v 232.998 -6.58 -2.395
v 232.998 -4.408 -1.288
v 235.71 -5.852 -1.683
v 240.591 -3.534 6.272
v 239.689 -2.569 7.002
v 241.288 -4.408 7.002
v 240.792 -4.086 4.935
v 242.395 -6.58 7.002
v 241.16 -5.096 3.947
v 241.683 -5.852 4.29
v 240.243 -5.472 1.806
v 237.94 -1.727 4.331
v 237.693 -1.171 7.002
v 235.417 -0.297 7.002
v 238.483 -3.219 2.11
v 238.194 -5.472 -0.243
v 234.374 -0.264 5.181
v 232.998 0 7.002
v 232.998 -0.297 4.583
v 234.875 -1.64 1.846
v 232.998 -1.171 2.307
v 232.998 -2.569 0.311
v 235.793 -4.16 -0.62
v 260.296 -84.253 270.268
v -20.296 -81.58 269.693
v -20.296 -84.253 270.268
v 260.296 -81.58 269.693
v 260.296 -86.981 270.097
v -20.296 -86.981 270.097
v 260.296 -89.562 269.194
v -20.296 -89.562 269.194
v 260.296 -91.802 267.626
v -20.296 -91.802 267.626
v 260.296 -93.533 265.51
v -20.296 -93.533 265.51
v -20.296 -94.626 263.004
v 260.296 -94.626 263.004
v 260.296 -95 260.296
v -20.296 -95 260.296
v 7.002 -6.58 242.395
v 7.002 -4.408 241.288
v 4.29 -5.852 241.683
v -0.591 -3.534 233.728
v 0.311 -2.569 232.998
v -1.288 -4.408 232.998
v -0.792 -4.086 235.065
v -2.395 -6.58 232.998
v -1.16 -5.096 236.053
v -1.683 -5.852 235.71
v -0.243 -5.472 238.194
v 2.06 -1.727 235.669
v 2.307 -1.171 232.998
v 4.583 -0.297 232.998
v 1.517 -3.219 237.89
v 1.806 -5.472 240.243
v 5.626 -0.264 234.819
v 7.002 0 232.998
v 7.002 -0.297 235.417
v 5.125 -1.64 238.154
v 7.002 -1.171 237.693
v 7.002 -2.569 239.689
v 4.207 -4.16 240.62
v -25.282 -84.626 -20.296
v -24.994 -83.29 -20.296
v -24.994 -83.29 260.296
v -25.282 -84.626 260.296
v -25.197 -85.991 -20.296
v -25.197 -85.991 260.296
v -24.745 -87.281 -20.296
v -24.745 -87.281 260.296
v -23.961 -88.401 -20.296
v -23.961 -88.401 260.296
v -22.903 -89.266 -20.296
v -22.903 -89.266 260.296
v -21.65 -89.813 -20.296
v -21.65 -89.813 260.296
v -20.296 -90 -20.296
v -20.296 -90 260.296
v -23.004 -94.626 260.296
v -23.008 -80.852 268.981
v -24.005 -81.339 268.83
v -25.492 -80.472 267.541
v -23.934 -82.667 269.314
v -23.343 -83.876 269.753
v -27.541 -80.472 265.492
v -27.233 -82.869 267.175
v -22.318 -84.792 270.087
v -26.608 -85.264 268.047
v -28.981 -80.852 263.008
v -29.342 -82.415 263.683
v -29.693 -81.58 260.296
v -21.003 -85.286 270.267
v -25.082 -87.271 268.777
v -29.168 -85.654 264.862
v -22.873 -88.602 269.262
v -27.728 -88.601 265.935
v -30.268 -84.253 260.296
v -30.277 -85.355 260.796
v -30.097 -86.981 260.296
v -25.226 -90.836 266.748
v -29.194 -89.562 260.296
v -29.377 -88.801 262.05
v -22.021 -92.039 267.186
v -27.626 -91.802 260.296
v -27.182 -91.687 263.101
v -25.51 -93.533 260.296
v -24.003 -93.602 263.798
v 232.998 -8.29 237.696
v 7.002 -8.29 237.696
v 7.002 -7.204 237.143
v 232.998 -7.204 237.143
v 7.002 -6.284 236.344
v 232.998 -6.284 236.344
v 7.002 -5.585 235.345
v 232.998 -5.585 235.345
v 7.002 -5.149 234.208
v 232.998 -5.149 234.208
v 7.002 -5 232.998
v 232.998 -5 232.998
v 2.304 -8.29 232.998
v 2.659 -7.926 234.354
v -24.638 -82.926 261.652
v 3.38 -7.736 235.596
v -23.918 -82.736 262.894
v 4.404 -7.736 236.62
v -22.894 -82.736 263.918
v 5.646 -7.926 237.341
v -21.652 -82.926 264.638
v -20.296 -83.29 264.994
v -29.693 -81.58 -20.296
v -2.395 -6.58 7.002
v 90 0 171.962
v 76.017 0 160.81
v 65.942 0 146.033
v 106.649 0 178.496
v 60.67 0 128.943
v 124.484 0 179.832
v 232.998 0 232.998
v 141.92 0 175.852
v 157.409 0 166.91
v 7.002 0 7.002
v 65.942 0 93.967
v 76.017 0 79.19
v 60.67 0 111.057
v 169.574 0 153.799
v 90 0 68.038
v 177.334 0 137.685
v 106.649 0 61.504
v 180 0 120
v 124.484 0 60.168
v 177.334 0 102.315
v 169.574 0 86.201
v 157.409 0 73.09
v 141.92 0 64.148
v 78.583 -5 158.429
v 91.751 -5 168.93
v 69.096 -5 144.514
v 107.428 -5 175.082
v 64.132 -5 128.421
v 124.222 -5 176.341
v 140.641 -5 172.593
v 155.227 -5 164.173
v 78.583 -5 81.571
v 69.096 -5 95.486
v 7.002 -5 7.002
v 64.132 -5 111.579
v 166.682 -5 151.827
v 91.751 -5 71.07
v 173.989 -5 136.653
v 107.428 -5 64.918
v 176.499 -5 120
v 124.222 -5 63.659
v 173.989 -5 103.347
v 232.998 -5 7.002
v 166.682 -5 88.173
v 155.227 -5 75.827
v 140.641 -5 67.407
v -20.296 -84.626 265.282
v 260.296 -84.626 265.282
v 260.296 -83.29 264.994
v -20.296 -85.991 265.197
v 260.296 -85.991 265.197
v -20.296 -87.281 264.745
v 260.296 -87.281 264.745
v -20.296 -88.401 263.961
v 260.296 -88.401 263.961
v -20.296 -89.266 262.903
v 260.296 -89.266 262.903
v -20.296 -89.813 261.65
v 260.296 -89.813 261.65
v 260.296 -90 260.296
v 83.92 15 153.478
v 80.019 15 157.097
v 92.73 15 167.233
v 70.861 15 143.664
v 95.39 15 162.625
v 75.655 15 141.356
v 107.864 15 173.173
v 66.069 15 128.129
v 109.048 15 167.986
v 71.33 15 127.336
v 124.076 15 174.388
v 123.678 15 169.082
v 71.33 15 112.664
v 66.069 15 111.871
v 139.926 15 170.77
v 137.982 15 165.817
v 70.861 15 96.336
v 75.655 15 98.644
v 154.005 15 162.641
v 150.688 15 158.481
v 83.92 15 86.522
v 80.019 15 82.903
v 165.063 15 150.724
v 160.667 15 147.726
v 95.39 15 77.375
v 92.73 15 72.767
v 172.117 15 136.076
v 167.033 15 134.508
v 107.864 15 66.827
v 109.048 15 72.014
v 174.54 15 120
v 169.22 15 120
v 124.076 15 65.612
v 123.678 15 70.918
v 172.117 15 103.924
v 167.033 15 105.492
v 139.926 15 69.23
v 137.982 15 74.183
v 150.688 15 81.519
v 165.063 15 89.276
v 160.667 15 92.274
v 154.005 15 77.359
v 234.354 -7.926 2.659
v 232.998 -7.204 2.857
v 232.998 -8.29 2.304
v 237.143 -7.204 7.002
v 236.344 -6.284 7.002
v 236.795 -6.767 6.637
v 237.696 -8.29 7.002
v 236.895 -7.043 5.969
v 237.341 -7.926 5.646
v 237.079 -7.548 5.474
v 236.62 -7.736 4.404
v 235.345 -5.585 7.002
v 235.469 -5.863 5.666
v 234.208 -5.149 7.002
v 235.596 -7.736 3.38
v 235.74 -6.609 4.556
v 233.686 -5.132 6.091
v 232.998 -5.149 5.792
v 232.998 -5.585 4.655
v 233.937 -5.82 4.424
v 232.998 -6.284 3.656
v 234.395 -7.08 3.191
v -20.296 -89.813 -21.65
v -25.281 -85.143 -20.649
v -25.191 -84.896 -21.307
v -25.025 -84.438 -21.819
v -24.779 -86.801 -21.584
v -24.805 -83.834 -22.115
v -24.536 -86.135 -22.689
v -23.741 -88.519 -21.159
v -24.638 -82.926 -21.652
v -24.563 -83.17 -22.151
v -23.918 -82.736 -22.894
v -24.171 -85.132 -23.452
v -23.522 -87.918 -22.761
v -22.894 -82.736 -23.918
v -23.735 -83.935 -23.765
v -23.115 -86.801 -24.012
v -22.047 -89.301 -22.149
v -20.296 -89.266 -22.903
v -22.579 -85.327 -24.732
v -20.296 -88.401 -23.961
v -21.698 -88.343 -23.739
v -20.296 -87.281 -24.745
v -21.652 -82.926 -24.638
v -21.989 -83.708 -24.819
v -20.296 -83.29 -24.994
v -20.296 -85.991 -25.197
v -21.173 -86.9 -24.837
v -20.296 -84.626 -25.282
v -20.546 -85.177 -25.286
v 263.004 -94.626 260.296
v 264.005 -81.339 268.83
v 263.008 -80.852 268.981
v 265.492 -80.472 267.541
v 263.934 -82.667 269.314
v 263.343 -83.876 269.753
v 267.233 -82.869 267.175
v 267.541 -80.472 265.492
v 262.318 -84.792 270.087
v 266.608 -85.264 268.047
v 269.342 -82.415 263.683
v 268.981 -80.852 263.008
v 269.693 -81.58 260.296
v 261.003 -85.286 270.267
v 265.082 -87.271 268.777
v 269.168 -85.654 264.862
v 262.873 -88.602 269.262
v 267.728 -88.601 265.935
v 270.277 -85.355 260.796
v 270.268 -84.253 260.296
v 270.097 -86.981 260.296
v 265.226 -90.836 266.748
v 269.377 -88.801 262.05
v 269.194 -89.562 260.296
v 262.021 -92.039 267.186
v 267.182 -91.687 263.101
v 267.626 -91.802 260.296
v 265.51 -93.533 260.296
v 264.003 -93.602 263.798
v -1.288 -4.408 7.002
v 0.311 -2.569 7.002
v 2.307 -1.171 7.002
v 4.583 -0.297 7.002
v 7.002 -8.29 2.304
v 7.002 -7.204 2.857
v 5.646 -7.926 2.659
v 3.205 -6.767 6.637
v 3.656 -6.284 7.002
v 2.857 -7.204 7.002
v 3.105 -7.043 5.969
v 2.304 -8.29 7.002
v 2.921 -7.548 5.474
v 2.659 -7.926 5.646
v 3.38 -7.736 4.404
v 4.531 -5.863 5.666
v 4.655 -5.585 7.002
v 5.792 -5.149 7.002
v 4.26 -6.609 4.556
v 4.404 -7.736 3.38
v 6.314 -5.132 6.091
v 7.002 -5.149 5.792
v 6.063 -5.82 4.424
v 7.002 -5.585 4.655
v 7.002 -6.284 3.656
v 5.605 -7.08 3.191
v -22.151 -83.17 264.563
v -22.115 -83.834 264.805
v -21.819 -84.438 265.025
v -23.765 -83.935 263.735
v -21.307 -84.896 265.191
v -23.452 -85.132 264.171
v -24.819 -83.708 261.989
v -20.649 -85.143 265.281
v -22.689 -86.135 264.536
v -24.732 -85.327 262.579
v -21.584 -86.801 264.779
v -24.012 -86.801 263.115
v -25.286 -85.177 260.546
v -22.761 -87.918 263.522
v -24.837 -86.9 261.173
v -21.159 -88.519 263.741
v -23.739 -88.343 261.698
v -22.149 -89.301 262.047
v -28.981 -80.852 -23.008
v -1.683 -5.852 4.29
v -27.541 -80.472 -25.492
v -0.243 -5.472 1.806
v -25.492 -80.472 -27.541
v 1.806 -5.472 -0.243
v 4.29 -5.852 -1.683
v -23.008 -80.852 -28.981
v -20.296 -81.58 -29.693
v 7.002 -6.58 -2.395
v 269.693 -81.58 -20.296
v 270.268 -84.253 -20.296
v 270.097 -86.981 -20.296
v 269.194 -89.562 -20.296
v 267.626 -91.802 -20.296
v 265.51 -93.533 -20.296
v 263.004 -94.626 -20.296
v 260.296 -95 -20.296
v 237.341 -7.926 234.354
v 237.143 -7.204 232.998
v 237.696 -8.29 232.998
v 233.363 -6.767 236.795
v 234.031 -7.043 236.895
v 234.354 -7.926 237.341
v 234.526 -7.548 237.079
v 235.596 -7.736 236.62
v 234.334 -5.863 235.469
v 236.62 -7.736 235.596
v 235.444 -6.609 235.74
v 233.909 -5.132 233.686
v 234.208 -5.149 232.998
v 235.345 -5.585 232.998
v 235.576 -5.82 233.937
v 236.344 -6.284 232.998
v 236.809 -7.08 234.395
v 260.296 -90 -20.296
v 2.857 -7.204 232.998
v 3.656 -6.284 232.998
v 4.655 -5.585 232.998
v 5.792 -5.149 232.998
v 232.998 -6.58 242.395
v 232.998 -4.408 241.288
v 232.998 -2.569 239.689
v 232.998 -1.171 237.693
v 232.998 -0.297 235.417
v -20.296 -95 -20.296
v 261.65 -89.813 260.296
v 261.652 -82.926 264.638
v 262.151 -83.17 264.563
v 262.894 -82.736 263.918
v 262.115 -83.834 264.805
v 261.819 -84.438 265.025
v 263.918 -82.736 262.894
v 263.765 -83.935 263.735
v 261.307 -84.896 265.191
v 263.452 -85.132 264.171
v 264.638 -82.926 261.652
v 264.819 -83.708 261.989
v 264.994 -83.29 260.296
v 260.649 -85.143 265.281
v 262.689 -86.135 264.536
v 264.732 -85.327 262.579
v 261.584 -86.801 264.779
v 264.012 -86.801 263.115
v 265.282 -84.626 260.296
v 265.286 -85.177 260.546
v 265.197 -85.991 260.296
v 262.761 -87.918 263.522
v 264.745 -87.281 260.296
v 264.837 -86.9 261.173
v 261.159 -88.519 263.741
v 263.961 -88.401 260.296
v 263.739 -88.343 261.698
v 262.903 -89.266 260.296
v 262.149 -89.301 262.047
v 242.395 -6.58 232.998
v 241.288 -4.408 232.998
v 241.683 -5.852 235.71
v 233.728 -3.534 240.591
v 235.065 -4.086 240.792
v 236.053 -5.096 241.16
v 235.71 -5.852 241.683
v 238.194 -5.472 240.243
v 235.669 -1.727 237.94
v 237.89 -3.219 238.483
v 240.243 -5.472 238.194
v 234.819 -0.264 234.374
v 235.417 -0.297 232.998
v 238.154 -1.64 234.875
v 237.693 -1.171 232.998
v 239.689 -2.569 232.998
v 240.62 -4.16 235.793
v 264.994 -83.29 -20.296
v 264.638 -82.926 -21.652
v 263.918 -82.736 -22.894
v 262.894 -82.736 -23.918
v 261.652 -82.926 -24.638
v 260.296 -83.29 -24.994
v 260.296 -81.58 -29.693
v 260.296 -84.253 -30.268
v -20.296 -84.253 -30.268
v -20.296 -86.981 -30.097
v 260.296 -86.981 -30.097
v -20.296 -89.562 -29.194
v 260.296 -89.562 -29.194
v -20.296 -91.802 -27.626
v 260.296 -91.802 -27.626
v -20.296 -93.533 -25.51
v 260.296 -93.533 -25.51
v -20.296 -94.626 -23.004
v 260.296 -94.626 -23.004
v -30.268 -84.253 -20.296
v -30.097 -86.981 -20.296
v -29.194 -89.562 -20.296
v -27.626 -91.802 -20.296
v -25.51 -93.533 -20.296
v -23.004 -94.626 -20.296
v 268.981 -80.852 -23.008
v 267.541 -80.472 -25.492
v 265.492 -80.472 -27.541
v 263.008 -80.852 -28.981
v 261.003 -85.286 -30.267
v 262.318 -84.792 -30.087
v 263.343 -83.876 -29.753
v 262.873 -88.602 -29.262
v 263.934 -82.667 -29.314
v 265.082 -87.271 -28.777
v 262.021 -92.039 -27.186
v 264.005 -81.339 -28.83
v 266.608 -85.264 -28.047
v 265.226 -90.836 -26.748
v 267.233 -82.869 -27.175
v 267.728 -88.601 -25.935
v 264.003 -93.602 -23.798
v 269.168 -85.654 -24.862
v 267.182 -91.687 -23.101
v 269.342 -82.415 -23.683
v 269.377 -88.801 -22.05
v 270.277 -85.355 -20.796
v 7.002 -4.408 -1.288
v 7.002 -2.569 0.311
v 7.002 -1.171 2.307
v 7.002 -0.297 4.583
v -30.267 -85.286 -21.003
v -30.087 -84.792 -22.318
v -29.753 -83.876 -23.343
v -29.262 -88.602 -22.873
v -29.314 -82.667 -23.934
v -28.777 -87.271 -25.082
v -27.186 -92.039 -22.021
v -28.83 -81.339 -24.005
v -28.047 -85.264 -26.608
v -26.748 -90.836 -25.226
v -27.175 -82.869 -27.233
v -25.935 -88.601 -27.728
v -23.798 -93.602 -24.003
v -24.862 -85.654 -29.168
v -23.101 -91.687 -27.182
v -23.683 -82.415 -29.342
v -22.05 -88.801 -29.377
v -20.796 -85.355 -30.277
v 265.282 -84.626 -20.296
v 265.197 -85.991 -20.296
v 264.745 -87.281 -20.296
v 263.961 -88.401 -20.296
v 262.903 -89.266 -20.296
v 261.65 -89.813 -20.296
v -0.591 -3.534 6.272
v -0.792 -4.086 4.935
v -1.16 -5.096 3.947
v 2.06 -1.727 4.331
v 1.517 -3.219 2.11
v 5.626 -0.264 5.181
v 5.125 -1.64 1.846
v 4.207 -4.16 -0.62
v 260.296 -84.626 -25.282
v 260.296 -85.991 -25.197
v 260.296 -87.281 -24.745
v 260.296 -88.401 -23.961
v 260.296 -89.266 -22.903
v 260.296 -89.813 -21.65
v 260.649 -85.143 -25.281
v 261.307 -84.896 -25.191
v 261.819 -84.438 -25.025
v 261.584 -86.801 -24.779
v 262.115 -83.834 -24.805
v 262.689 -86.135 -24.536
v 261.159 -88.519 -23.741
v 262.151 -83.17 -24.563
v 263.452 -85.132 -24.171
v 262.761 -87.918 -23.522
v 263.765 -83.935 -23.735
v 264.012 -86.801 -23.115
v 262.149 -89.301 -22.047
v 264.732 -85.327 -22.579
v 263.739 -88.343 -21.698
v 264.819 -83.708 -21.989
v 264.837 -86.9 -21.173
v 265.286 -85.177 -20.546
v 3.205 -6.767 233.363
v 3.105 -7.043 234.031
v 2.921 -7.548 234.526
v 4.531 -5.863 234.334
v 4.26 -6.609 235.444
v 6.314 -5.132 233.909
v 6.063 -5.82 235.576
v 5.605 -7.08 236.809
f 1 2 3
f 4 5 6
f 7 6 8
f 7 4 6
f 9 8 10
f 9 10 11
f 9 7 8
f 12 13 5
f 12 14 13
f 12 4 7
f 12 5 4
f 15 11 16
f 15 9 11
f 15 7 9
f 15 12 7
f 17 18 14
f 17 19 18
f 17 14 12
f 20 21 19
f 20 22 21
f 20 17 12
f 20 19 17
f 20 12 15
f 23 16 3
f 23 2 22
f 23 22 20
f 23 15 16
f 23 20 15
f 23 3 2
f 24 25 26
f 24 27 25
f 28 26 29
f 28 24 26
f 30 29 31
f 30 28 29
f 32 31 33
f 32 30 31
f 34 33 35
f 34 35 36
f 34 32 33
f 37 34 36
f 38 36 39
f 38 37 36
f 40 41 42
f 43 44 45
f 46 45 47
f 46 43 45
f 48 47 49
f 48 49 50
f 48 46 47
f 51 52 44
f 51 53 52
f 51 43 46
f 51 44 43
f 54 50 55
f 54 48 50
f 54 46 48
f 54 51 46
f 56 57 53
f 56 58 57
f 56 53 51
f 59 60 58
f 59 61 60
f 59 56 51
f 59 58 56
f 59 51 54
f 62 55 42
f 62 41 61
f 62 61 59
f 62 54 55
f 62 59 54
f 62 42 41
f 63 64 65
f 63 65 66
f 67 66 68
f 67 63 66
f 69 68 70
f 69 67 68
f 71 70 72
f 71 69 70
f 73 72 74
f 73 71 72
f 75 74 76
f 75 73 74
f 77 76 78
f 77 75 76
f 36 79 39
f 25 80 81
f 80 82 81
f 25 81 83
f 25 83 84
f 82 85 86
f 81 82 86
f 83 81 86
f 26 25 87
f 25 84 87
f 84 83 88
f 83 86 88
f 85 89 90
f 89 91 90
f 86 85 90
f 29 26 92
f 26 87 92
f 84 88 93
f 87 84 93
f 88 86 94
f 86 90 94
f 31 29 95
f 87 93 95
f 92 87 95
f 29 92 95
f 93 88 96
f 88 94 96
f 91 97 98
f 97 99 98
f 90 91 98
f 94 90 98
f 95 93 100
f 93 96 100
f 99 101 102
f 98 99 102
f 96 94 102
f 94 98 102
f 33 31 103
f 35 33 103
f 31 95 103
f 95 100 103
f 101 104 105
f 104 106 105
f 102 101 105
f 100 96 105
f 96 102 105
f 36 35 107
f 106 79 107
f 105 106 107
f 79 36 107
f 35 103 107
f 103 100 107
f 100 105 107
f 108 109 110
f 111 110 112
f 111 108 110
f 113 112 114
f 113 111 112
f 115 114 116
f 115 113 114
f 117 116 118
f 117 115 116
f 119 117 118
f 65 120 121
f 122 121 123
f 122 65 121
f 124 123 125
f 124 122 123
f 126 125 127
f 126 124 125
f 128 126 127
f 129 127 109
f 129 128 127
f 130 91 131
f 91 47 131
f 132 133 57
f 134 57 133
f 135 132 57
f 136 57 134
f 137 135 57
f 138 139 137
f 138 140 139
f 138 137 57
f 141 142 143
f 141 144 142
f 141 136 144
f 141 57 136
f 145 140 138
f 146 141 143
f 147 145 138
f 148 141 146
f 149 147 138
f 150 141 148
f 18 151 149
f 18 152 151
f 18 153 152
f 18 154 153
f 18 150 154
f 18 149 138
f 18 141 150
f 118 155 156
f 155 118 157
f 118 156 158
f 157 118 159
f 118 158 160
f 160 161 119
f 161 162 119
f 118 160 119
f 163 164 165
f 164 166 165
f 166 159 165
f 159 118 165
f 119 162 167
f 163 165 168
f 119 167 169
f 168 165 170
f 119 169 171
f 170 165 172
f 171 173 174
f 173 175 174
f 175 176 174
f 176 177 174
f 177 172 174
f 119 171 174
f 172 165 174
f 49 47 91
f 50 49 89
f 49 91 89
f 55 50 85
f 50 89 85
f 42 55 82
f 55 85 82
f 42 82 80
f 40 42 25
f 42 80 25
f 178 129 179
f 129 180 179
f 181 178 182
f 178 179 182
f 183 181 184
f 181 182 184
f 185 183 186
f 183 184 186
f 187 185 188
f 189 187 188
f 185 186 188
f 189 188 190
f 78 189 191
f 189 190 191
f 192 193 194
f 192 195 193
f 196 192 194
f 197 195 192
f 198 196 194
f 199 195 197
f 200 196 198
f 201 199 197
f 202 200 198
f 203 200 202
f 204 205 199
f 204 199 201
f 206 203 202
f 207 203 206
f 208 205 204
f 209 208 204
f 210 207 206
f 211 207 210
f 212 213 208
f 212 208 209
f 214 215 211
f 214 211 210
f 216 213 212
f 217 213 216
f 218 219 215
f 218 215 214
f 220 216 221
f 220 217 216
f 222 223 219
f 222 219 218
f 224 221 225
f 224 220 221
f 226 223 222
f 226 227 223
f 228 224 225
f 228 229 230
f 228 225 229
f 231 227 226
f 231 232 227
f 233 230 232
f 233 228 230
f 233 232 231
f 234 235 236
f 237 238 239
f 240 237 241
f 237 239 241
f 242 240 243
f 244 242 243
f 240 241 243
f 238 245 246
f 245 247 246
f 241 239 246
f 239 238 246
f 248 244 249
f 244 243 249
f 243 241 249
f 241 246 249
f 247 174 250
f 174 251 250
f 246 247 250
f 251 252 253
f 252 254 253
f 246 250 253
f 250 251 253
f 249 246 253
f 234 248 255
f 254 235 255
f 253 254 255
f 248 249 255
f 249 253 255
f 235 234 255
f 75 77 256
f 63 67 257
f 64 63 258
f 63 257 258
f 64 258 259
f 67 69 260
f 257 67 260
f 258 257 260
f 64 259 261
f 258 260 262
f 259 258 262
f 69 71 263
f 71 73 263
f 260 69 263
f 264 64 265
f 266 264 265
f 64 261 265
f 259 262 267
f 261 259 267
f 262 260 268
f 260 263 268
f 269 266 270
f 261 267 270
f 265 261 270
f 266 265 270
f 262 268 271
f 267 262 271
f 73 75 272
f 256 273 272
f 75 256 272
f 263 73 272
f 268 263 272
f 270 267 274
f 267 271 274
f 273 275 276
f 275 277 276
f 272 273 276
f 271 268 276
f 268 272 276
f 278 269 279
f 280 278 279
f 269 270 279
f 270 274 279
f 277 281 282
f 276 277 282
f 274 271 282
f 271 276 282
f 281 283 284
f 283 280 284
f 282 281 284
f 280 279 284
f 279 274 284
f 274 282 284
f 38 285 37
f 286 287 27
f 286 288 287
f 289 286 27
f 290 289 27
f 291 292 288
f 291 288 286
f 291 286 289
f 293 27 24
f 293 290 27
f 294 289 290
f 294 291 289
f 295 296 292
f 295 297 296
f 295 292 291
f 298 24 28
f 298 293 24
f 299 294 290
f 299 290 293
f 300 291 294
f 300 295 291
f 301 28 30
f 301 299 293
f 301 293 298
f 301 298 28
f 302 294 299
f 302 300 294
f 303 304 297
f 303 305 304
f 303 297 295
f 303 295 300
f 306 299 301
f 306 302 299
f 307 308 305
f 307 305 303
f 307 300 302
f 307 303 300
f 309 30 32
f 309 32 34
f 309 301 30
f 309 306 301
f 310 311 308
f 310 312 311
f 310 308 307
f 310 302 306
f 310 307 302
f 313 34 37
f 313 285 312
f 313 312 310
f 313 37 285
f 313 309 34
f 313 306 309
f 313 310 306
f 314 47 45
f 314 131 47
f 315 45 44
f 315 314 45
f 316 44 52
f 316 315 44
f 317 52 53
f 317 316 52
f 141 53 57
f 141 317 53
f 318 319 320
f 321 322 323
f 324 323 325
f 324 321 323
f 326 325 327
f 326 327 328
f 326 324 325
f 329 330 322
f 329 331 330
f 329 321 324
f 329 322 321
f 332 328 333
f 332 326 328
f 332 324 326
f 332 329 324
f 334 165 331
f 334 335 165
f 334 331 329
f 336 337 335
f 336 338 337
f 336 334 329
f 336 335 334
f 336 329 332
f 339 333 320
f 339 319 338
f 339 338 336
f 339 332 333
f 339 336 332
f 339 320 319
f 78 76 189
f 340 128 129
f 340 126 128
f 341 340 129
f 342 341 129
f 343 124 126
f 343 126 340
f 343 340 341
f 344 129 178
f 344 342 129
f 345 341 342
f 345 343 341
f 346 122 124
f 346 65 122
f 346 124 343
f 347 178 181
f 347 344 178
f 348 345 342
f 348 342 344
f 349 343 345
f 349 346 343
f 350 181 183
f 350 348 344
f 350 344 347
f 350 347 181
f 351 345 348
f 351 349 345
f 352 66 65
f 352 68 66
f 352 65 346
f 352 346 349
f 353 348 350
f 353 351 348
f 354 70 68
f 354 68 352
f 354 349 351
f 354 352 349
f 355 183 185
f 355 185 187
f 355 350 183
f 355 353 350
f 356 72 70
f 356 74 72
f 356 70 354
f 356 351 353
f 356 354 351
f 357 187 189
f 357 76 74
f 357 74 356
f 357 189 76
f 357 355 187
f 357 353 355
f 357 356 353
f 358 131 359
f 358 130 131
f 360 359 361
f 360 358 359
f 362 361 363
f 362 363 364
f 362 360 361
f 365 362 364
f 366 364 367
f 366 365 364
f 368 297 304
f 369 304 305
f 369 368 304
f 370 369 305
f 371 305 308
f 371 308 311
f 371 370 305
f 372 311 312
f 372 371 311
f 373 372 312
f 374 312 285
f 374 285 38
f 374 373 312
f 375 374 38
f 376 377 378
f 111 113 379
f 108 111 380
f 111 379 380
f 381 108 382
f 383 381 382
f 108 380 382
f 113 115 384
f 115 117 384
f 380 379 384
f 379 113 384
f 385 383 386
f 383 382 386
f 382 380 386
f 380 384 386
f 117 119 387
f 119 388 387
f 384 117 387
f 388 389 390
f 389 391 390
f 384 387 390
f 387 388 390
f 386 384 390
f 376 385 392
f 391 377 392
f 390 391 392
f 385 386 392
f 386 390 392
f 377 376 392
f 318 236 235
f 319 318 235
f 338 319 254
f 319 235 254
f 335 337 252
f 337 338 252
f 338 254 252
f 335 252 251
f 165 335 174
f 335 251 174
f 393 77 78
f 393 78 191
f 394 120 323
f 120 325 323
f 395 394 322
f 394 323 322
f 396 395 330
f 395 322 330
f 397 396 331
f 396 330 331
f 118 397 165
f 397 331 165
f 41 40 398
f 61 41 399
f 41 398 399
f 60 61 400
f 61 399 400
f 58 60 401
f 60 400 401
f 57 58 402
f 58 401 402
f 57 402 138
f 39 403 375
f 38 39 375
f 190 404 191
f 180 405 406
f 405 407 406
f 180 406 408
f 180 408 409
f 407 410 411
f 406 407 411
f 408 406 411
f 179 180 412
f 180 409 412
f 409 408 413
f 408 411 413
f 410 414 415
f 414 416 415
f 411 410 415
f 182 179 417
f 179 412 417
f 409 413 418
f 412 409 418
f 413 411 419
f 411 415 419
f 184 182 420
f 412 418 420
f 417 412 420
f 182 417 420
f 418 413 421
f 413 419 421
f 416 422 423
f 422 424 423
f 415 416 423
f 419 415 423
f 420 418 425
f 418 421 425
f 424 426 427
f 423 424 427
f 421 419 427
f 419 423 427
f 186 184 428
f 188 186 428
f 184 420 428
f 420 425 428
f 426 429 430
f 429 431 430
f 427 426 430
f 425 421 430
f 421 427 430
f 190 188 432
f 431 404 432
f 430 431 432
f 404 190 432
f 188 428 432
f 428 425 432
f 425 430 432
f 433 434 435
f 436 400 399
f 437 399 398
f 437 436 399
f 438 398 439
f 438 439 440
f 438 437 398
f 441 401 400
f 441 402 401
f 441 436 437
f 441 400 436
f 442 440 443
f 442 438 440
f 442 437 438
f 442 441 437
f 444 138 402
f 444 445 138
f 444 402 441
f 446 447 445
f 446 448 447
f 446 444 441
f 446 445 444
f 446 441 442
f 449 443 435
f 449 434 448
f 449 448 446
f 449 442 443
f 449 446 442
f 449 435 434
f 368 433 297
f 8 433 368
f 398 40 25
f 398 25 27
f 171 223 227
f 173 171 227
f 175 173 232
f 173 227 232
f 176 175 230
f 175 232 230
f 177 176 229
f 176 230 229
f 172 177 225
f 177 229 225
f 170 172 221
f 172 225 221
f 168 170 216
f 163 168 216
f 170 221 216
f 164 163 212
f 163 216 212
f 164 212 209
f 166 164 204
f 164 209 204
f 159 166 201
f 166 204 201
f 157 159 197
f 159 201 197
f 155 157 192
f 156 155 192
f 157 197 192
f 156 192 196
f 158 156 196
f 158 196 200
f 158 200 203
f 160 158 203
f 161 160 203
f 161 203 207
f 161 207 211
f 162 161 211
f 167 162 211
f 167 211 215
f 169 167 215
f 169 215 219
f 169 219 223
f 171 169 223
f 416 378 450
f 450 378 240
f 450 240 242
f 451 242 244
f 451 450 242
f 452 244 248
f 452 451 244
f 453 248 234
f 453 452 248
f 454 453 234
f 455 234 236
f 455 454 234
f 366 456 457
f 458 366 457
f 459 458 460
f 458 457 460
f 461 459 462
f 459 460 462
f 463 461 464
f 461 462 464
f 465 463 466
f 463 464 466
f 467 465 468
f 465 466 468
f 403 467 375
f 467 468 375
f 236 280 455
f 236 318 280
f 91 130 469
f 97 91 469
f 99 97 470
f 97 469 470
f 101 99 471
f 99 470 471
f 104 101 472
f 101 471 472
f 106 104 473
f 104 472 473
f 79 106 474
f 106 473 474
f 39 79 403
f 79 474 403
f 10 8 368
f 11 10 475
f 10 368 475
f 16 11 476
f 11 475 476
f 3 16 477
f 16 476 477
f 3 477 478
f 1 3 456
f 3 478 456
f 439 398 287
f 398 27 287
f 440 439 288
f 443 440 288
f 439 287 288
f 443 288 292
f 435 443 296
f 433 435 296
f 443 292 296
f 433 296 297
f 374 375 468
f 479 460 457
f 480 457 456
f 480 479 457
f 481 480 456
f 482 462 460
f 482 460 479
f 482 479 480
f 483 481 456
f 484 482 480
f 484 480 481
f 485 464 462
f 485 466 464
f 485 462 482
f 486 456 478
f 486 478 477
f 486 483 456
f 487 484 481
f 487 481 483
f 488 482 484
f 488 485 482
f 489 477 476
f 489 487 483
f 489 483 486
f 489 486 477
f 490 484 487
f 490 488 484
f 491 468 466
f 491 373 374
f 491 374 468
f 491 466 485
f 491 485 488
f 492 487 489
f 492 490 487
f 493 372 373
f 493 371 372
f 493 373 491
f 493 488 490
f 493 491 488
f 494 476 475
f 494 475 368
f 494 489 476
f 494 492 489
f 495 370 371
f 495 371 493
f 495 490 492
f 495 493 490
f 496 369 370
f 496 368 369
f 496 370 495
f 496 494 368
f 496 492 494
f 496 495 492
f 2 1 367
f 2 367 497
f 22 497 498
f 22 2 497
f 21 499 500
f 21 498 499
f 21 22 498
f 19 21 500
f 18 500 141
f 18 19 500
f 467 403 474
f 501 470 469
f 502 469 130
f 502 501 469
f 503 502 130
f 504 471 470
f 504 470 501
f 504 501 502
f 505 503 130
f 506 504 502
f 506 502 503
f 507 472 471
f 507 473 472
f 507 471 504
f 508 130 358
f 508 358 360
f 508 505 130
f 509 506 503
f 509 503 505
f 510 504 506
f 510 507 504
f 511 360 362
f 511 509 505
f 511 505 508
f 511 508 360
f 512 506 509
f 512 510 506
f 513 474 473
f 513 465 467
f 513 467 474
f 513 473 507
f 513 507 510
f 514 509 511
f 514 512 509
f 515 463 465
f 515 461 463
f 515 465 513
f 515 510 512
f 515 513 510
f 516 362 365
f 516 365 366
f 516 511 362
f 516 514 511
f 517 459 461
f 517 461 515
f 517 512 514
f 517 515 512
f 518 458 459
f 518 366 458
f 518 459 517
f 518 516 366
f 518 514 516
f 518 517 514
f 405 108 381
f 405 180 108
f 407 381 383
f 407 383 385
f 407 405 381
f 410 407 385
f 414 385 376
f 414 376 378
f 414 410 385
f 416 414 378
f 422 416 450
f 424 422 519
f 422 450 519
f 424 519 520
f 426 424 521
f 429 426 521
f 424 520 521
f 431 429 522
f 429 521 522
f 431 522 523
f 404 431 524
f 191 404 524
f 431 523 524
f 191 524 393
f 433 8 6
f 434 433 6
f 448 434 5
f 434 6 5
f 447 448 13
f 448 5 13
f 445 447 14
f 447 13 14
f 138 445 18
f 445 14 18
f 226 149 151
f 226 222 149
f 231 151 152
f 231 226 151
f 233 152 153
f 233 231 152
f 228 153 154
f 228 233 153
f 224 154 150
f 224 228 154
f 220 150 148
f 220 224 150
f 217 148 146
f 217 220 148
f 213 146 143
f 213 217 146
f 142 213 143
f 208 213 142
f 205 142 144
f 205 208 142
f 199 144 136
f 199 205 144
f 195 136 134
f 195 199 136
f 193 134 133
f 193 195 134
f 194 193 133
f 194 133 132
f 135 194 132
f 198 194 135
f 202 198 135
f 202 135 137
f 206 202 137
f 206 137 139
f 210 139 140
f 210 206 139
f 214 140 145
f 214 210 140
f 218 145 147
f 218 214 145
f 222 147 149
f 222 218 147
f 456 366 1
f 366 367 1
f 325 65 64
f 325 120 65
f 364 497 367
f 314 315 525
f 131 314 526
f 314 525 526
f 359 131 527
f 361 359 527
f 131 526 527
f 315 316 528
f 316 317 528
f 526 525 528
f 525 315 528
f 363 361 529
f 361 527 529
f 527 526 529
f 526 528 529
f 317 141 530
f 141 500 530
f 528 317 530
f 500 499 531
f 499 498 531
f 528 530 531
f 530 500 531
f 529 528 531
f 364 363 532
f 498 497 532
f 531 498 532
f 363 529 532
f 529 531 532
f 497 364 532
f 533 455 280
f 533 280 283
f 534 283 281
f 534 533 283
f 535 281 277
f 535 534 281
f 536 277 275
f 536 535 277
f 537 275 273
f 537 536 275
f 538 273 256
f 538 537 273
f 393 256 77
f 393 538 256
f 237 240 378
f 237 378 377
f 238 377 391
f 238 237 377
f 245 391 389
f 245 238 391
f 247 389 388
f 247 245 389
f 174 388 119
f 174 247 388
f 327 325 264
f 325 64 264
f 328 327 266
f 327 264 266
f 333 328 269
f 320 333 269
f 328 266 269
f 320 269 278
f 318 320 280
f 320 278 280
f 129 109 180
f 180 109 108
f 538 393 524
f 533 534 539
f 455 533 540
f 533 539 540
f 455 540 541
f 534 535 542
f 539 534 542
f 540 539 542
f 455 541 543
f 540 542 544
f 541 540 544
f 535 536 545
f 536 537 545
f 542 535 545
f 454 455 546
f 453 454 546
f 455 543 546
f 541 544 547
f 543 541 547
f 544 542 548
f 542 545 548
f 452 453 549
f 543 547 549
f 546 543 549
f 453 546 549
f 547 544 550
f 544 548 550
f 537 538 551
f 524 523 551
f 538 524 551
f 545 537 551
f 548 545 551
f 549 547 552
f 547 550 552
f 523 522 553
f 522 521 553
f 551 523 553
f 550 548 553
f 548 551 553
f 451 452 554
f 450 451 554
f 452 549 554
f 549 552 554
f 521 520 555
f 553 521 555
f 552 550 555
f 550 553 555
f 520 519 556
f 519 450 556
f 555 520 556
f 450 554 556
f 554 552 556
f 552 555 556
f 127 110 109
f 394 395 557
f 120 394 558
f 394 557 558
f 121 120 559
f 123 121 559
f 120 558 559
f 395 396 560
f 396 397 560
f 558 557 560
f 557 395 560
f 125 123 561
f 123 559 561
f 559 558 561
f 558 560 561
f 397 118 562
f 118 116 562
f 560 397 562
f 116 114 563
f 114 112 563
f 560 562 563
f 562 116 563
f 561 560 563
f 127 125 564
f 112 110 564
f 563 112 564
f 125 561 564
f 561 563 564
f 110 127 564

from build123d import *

# Parameters (mm, degrees)
SKETCH1_W           = 480
SKETCH1_H           = 480
BOSS_EXTRUDE1_DEPTH = 190
BOSS_EXTRUDE1_DRAFT = 20
FILLET1_R           = 20
SKETCH2_R           = 120
BOSS_EXTRUDE2_DEPTH = 30
BOSS_EXTRUDE2_TAPER = 20
SHELL1_T            = -10
SCALE1_SCALE        = 0.5


with BuildPart() as part:
    # Sketch1 → Boss-Extrude1 (with draft: the straight prism first)
    with BuildSketch(Plane(origin=(0, 0, 0), x_dir=(1, 0, 0), z_dir=(0, 1, 0))):
        with Locations((240, -240)):
            Rectangle(SKETCH1_W, SKETCH1_H)
    extrude(amount=-BOSS_EXTRUDE1_DEPTH)
    # Boss-Extrude1: the draft: its side faces are tilted about the plane it starts from
    boss_extrude1_sides = [part.faces().sort_by_distance(p)[0] for p in [
        (0, -95, 240),
        (240, -95, 480),
        (480, -95, 240),
        (240, -95, 0),
    ]]
    draft(boss_extrude1_sides, Plane(origin=(0, 0, 0), x_dir=(1, 0, 0), z_dir=(0, 1, 0)), BOSS_EXTRUDE1_DRAFT)

    # Fillet1
    fillet1_edges = [part.edges().sort_by_distance(p)[0] for p in [
        (549.154344511, -190, 240),
        (240, -190, -69.154344511),
        (-69.154344511, -190, 240),
        (240, 0, 0),
        (480, 0, 240),
        (240, 0, 480),
        (0, 0, 240),
        (-34.577172255, -95, -34.577172255),
        (514.577172255, -95, -34.577172255),
        (514.577172255, -95, 514.577172255),
        (-34.577172255, -95, 514.577172255),
        (240, -190, 549.154344511),
    ]]
    fillet(fillet1_edges, radius=FILLET1_R)

    # Sketch2 → Boss-Extrude2 (add)
    with BuildSketch(Plane(origin=(0, 0, 0), x_dir=(1, 0, 0), z_dir=(0, 1, 0))):
        with Locations((240, -240)):
            Circle(SKETCH2_R)
    extrude(amount=BOSS_EXTRUDE2_DEPTH, taper=BOSS_EXTRUDE2_TAPER)

    # Shell1
    shell1_openings = [part.faces().sort_by_distance(p)[0] for p in [
        (240, 30, 240),
    ]]
    offset(amount=SHELL1_T, openings=shell1_openings, kind=Kind.INTERSECTION)


with BuildPart() as part_1:
    # Scale1: scaled about (0, 0, 0)
    add(part.part.scale(SCALE1_SCALE))


solid = part_1.part
